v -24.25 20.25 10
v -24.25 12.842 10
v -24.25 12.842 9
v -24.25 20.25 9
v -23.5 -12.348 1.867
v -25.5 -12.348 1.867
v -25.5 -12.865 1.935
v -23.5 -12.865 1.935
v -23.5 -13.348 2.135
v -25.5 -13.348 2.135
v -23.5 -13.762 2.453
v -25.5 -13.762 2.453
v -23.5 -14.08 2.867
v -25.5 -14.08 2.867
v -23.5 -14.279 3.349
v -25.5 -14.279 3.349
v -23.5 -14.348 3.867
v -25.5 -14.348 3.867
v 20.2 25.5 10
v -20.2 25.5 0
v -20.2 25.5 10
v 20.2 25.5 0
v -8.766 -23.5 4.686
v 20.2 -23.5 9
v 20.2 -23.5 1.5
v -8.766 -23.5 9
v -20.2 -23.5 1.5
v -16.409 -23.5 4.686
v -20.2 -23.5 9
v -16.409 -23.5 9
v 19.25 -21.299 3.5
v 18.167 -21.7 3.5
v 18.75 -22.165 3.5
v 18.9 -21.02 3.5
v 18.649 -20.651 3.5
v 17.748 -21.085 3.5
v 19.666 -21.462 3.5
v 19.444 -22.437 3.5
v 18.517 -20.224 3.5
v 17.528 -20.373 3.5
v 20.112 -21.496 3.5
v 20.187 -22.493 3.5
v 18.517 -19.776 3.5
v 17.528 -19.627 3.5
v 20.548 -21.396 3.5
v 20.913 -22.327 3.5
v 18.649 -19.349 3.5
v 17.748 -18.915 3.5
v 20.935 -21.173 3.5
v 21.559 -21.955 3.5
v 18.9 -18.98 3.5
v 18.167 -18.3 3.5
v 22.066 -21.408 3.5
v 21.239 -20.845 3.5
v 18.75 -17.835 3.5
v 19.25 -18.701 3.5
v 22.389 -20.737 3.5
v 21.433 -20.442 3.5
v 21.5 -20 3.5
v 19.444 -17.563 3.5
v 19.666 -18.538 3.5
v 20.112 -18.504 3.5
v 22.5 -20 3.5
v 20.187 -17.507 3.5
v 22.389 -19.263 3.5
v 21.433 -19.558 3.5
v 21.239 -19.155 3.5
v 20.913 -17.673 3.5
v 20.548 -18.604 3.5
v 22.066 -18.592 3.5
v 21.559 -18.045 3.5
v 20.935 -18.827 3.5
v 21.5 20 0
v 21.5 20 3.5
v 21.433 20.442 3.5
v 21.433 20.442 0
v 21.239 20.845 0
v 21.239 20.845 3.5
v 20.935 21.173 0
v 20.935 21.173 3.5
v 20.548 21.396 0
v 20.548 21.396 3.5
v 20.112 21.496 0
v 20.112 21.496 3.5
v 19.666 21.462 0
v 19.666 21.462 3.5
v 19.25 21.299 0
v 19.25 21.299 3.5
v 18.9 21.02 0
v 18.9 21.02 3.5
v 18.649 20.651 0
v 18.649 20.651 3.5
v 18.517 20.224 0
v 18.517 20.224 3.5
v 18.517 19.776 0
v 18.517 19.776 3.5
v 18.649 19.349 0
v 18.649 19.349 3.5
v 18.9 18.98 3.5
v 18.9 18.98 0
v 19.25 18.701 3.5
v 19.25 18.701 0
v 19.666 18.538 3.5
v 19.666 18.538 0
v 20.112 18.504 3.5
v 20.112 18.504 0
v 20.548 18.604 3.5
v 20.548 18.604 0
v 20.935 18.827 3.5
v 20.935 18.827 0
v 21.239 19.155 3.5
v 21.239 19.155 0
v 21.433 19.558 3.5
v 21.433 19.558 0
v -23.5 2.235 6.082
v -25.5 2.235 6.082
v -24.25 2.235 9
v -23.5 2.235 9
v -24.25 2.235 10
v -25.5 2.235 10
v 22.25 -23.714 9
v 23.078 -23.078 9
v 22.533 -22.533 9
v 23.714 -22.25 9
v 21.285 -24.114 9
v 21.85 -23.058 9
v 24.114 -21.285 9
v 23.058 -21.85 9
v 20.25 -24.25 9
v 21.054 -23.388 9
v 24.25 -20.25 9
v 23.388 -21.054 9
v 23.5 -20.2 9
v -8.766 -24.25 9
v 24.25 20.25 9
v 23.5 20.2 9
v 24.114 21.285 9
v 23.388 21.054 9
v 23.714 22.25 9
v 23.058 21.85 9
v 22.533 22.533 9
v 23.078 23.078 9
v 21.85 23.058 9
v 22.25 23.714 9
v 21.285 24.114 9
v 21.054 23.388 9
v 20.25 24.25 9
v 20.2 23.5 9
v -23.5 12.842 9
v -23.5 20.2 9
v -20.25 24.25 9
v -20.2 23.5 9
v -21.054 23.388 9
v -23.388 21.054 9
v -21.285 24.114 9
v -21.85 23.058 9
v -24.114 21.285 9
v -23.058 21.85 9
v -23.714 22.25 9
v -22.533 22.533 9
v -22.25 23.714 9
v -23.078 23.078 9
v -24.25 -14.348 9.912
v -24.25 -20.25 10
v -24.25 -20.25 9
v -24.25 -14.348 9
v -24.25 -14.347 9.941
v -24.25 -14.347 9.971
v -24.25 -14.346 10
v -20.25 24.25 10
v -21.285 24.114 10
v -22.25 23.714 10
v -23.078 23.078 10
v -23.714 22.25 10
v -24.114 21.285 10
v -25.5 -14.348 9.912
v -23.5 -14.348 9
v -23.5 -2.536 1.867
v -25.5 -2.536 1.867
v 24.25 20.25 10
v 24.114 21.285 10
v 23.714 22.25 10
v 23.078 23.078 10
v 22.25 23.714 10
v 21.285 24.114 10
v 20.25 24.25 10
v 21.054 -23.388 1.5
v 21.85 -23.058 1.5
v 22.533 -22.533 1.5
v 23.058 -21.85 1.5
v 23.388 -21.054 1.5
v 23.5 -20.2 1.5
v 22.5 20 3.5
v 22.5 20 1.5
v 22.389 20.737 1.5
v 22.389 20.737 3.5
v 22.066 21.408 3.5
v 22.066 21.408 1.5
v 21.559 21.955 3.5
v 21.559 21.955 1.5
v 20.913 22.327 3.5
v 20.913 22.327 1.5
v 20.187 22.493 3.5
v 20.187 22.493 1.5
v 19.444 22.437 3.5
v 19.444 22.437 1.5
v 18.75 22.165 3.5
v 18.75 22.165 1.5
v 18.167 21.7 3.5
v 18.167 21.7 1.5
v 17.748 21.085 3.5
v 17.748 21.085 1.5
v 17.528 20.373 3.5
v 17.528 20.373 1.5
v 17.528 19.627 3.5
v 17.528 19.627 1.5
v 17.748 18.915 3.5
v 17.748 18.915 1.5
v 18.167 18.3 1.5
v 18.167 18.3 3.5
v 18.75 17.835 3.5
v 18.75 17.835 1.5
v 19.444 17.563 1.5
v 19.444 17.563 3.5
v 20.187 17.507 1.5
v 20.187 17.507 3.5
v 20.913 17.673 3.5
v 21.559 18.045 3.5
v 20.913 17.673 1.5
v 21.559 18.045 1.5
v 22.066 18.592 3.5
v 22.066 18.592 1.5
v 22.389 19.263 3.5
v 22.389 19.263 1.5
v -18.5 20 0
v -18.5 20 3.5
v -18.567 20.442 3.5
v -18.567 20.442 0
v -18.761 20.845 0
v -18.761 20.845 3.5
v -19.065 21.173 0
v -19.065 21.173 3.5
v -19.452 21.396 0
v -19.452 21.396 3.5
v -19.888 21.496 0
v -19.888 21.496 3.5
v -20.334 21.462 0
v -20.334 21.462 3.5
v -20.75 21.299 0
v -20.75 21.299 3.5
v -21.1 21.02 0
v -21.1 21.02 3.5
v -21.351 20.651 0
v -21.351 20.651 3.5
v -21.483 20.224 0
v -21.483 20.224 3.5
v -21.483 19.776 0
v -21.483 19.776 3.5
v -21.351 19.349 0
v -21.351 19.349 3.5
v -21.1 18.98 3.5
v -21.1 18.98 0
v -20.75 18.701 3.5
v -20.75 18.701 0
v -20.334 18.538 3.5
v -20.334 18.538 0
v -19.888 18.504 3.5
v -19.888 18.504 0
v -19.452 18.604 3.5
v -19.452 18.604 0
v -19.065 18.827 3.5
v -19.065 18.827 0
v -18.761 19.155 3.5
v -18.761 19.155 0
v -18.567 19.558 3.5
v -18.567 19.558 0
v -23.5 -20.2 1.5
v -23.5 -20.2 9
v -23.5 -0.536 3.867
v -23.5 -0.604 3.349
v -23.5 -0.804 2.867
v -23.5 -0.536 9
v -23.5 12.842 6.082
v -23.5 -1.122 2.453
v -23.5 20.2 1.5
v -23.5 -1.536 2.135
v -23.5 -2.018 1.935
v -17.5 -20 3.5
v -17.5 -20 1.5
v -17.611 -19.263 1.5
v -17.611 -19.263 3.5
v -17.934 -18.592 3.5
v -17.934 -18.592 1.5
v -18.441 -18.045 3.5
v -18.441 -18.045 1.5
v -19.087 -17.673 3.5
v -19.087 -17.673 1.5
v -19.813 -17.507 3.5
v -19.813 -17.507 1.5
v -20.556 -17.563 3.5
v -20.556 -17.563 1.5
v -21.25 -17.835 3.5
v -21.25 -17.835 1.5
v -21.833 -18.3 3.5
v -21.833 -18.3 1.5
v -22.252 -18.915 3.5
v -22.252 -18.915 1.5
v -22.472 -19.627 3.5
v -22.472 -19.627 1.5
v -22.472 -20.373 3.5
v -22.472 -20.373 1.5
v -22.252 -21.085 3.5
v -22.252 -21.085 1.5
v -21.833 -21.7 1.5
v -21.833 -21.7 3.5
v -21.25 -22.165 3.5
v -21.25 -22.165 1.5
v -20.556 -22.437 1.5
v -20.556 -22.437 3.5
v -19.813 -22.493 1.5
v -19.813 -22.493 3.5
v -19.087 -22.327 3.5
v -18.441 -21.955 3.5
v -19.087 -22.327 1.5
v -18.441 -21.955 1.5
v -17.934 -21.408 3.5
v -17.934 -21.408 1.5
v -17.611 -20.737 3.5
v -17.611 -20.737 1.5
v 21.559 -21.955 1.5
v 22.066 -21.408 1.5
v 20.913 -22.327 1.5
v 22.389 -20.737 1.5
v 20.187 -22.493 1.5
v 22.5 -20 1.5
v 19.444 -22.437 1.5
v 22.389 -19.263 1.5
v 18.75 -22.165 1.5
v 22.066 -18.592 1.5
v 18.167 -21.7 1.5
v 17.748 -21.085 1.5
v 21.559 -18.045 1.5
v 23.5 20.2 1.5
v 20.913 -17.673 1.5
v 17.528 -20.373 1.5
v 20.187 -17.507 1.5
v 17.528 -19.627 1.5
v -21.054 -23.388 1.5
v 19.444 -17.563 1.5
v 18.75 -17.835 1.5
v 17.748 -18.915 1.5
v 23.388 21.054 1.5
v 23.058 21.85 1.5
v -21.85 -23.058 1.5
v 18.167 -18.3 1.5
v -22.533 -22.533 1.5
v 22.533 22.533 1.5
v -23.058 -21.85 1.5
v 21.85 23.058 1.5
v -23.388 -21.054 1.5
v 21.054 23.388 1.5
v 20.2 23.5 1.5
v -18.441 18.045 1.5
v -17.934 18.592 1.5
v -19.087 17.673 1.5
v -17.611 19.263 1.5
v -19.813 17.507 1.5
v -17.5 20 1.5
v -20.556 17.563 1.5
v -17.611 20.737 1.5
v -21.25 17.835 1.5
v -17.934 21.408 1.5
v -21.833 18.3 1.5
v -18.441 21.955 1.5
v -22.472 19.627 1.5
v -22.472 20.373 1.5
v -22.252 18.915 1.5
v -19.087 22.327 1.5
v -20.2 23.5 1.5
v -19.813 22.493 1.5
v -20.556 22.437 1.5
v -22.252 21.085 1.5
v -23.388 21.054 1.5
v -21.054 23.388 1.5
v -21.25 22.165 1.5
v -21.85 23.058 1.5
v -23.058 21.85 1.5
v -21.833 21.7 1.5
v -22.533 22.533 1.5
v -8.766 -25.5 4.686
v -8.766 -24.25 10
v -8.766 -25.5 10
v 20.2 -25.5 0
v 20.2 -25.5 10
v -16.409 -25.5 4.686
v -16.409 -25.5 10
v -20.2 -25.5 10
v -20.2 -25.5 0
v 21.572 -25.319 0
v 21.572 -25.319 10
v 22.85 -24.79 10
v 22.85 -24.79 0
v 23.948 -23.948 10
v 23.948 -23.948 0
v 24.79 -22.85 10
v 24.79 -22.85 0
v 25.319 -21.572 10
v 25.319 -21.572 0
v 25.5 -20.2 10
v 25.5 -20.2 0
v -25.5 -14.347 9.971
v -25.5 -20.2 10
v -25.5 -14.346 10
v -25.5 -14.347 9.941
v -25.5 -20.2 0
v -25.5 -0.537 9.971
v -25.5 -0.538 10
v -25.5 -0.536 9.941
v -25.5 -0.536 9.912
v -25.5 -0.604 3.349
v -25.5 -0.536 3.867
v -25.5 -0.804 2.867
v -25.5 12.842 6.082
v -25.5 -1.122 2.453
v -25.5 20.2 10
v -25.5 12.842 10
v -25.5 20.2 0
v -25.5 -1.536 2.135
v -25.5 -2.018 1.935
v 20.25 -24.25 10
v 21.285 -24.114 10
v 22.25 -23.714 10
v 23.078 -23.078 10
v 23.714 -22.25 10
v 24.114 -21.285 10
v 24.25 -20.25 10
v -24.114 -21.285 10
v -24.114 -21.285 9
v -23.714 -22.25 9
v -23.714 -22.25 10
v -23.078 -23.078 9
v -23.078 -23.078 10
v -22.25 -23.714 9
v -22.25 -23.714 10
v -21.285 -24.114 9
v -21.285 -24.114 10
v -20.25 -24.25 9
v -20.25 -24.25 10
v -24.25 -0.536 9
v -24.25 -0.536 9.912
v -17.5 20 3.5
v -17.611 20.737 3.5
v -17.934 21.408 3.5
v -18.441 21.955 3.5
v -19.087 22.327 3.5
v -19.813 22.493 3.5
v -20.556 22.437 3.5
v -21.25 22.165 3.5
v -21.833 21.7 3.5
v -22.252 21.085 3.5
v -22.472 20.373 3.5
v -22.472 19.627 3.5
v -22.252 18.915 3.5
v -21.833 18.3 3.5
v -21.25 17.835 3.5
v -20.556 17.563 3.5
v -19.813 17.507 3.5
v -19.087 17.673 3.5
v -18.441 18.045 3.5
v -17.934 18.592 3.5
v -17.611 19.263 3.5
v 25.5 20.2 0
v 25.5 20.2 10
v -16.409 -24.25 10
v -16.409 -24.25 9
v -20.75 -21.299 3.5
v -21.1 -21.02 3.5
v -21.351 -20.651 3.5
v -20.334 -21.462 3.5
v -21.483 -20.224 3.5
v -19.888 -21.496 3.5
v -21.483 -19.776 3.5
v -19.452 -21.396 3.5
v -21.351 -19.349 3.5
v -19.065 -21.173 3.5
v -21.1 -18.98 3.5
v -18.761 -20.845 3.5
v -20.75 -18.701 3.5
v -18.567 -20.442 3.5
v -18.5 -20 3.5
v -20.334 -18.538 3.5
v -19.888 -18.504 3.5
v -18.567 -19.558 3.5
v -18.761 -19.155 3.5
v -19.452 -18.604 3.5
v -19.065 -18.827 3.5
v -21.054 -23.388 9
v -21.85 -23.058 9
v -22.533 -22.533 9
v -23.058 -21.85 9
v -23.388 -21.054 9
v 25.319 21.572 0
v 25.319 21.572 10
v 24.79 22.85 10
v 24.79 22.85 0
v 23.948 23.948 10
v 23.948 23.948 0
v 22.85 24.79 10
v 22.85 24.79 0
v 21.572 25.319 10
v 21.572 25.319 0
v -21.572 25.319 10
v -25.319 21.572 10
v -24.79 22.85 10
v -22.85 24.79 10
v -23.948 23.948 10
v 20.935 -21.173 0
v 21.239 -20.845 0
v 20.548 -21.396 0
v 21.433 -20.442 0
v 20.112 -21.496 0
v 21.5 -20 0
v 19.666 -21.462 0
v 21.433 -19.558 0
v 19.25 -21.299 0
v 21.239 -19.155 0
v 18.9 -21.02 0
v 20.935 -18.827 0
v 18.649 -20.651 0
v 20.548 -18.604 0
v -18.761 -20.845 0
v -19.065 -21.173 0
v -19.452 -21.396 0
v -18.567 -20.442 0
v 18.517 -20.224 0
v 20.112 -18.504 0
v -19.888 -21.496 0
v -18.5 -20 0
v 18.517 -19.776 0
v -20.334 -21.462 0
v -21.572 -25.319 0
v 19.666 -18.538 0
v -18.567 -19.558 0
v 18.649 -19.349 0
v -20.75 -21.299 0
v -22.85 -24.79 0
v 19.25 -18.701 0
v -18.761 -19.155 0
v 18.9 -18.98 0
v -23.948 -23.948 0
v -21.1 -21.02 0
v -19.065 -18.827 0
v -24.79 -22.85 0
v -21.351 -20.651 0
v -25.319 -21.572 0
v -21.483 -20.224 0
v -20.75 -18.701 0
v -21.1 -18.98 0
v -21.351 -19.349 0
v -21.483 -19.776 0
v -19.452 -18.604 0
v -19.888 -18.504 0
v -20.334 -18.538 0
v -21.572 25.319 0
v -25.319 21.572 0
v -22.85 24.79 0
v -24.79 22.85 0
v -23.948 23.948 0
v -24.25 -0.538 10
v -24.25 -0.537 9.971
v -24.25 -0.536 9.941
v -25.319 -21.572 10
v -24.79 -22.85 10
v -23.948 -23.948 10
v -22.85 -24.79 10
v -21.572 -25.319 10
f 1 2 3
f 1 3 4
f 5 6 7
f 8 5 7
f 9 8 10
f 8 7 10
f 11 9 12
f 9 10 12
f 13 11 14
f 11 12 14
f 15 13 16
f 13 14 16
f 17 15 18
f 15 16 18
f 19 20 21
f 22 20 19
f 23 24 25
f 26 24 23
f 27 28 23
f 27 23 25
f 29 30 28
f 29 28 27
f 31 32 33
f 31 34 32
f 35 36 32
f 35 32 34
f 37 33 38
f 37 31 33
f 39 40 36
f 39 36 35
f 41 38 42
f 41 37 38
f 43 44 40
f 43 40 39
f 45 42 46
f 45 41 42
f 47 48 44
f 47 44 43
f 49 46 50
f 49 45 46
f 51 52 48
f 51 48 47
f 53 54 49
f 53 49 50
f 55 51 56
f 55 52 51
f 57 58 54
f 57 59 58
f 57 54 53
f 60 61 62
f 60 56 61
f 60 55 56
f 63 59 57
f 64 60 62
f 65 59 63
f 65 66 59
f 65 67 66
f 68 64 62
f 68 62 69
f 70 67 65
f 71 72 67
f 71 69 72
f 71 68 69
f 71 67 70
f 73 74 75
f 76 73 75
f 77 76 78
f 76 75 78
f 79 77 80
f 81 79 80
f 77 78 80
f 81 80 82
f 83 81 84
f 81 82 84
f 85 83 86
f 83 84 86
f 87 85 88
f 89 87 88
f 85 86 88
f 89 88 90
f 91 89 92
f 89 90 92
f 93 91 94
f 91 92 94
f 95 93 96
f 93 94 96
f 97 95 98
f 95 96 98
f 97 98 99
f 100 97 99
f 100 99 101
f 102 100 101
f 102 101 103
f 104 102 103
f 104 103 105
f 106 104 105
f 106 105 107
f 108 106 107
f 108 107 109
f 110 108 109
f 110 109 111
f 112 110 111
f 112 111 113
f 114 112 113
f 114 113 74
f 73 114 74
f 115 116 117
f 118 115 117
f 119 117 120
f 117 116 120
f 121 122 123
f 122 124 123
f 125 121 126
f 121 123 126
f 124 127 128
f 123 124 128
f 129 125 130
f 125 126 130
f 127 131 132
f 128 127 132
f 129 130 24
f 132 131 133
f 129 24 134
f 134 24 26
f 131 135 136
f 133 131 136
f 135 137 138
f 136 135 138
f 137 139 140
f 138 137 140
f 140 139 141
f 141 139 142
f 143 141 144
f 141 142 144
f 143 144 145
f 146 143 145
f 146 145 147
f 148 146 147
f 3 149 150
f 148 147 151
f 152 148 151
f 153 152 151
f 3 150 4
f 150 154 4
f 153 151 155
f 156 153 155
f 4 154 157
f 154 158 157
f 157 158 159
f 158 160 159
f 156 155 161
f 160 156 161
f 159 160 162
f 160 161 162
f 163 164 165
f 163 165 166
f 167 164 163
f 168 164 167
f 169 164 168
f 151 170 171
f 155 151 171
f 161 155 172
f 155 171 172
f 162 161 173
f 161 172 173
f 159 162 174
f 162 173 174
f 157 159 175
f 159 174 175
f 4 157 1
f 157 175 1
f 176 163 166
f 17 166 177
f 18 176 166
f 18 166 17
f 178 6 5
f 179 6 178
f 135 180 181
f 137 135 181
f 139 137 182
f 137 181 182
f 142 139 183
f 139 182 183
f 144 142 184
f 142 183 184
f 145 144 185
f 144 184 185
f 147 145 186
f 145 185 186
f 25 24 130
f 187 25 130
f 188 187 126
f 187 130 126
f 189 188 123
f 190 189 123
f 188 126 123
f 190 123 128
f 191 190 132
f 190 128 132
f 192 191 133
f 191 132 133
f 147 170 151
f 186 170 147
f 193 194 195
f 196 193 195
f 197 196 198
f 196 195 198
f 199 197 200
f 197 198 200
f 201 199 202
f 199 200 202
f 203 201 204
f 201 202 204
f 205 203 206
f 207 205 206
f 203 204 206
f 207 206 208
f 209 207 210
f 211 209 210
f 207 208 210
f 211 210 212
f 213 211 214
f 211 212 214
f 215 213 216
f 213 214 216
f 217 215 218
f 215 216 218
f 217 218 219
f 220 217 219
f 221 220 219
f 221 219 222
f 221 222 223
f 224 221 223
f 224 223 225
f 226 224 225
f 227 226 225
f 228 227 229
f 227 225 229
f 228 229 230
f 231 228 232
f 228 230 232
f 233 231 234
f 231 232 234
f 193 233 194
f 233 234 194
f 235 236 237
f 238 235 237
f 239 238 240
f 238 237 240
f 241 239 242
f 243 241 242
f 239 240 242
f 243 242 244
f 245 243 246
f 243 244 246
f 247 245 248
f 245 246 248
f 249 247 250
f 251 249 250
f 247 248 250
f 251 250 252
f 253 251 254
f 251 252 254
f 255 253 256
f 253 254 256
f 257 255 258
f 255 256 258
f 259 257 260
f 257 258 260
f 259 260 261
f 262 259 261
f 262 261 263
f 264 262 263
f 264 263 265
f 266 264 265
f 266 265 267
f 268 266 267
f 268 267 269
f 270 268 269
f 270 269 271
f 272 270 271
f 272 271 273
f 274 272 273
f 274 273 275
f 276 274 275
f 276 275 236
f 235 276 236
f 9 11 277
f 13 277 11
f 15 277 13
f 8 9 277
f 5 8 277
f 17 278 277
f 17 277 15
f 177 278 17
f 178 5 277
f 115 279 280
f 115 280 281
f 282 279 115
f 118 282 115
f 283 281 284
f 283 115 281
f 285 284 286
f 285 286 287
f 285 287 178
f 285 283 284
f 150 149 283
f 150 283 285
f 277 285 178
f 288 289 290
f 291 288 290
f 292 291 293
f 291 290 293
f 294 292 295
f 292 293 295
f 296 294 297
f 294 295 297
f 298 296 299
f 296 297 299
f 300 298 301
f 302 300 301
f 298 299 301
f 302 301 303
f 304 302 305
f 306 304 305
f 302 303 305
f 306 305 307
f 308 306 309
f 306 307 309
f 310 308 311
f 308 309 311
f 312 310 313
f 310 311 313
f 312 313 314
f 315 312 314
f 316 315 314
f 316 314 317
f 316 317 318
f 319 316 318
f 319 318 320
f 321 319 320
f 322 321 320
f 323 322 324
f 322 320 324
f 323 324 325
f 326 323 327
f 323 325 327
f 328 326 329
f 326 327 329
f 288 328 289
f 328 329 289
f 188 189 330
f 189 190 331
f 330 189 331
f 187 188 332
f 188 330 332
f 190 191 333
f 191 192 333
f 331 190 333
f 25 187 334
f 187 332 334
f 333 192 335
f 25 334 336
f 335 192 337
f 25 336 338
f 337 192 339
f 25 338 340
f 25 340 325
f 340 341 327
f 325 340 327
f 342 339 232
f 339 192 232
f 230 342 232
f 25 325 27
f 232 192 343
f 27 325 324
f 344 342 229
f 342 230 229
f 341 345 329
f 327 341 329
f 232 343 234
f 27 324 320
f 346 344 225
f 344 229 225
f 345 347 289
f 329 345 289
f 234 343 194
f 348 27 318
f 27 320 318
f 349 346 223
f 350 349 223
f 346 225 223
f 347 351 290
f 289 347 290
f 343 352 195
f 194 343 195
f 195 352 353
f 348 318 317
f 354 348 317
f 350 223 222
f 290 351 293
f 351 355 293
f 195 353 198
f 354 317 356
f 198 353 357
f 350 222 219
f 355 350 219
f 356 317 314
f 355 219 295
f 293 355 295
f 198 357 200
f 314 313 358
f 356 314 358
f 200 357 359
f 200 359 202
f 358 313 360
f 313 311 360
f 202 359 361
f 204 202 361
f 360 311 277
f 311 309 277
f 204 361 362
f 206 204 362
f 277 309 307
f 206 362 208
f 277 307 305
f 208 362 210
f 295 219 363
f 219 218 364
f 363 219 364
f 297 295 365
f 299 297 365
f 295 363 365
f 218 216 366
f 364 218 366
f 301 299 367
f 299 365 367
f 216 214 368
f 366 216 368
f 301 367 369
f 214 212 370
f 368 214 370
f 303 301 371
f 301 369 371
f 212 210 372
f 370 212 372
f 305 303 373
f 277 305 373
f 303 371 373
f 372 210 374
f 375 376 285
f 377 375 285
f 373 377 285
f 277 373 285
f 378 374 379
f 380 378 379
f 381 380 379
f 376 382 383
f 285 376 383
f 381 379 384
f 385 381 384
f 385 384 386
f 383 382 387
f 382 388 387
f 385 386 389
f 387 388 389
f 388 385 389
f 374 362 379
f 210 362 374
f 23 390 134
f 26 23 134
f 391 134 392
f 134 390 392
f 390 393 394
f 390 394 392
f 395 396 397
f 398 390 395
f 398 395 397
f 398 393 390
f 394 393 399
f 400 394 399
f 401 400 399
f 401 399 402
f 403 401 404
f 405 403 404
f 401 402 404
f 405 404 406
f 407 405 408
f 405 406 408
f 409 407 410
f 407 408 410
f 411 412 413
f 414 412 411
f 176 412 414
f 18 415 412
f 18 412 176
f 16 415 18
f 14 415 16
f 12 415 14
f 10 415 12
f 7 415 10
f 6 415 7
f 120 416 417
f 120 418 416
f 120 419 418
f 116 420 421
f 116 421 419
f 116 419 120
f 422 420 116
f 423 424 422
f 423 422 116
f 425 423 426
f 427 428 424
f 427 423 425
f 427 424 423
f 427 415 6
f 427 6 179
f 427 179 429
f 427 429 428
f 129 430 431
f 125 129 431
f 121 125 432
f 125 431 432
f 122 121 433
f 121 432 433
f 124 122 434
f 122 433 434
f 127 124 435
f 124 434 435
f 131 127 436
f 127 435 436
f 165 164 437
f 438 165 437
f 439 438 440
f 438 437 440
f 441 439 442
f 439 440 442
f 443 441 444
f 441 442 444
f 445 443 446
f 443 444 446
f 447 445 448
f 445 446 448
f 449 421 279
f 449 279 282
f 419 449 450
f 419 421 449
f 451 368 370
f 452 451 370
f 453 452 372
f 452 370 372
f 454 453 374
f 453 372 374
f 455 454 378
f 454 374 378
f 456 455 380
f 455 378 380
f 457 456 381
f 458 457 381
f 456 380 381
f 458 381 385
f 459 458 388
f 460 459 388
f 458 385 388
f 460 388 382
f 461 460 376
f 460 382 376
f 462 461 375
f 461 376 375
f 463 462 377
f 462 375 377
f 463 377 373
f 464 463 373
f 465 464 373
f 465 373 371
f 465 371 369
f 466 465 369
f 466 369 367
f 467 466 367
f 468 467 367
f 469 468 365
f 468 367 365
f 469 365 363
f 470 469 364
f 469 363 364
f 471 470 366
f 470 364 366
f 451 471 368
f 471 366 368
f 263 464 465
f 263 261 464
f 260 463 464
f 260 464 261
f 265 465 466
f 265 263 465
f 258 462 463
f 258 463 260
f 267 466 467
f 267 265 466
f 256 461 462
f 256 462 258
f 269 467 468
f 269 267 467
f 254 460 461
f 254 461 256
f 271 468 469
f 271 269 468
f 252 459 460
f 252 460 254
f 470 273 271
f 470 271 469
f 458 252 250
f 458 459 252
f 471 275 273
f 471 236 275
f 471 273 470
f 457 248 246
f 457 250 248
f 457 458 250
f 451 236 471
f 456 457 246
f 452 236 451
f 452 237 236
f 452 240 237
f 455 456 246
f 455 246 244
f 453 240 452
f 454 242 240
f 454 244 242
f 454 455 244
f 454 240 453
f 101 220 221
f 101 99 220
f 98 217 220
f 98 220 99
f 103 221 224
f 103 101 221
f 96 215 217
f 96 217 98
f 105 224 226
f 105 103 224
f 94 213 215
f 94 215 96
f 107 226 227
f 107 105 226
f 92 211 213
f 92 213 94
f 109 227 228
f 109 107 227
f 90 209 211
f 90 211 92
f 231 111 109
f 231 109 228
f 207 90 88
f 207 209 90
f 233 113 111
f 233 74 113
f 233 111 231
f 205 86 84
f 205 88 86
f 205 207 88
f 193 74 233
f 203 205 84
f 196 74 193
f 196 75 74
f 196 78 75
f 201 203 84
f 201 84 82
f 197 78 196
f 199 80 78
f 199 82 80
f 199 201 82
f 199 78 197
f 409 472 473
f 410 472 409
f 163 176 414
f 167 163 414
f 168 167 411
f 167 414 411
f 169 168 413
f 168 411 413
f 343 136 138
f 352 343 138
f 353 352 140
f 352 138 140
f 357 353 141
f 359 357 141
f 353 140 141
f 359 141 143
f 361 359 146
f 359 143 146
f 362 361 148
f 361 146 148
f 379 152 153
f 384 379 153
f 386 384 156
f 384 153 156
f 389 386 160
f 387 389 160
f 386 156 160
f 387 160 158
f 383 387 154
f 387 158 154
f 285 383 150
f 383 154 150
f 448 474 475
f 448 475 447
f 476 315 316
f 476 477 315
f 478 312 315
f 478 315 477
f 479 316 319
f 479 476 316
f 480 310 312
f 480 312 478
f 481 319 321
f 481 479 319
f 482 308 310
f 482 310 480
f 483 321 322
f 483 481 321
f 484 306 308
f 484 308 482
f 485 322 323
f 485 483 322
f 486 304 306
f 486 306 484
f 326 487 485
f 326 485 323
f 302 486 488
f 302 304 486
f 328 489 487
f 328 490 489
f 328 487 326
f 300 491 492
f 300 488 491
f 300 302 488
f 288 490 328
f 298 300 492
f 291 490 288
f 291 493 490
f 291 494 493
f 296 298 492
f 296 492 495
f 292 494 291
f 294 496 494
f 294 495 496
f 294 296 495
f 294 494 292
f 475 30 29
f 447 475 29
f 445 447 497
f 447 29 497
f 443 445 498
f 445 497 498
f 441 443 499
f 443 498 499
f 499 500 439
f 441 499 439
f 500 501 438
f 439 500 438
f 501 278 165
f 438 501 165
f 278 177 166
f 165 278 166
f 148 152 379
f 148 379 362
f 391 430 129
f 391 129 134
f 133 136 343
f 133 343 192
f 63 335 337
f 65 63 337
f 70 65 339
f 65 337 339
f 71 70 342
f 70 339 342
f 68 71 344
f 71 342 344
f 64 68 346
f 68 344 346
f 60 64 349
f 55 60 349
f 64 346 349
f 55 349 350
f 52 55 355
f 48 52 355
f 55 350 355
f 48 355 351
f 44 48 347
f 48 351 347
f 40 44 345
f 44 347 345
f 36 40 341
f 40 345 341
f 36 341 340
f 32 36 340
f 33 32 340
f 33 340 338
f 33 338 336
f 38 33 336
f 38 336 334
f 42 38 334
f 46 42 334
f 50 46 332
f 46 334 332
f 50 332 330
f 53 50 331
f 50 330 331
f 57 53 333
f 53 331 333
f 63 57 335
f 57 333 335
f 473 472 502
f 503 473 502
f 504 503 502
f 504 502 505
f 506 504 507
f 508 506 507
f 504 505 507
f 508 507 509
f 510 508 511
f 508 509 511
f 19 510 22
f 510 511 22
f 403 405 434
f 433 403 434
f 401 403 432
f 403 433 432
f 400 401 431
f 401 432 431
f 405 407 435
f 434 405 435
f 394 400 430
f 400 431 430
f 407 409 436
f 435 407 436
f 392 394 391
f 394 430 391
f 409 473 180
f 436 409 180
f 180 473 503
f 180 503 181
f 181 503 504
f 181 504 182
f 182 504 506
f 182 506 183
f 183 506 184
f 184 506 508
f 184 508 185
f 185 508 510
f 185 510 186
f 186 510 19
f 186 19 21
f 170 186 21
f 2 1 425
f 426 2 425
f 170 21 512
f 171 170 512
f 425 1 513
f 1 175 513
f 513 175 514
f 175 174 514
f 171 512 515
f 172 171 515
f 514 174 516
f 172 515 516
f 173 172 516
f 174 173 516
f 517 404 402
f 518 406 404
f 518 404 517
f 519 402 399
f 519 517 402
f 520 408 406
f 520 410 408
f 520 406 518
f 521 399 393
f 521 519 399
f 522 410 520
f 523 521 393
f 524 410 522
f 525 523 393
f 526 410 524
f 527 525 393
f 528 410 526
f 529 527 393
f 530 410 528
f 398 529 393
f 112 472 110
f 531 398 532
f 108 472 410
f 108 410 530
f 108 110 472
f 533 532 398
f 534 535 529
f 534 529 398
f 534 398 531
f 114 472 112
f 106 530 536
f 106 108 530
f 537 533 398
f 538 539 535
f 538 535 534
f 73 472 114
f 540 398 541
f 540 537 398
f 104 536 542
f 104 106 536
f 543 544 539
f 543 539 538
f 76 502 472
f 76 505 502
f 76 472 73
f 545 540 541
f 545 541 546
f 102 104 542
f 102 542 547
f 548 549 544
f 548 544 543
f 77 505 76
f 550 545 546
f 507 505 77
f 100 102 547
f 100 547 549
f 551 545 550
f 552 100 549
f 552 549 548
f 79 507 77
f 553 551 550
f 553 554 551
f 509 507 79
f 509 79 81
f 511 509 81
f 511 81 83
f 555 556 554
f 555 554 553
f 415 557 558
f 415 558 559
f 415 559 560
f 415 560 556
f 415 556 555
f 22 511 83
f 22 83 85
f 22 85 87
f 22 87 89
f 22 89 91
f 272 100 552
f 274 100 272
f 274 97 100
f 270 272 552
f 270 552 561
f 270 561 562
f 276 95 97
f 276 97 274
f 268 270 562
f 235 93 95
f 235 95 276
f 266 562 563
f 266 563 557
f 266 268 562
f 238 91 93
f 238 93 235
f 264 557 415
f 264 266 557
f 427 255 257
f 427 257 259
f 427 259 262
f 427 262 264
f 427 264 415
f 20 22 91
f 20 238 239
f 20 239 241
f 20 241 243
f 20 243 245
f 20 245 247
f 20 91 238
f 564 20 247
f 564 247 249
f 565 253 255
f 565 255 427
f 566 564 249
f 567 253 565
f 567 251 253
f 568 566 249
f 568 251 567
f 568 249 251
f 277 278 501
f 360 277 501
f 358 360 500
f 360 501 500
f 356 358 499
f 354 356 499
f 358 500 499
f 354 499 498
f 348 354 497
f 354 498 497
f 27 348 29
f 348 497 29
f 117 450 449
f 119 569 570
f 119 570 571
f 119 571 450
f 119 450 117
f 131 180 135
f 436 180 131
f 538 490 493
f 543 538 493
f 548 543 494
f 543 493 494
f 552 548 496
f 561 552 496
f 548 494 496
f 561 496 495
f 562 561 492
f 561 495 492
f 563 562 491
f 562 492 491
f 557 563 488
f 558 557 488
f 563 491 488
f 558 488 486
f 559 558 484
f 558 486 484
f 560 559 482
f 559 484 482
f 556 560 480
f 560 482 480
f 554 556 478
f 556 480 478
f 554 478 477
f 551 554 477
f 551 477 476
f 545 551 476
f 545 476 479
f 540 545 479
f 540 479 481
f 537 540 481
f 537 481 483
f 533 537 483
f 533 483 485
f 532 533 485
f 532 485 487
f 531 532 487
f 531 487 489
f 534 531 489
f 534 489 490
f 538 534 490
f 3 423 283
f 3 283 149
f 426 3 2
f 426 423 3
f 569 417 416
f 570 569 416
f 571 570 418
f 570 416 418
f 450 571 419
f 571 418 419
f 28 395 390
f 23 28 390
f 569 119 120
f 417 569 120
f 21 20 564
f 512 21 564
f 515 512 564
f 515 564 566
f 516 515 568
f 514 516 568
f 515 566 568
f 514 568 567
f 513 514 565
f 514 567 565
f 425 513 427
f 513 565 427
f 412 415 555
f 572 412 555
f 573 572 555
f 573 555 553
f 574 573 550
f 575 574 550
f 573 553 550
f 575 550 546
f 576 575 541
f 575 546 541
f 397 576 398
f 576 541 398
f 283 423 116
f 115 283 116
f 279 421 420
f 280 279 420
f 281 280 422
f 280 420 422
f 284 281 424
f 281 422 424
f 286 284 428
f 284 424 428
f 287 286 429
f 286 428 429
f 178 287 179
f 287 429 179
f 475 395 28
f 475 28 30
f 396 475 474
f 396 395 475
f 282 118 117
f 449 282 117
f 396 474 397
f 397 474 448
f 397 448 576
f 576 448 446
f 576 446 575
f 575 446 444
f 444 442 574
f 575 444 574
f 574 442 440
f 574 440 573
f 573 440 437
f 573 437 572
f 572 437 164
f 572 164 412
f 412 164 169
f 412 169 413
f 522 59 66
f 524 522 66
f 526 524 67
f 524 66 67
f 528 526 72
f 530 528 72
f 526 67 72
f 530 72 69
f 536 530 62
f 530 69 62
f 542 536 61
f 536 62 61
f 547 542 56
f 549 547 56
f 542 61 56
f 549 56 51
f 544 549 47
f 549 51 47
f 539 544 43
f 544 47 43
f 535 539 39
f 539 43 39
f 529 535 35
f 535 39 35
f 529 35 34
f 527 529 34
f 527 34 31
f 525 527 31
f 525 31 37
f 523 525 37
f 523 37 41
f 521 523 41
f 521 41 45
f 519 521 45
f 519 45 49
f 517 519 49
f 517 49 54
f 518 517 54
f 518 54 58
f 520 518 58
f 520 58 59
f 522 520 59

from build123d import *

# Parameters (mm, degrees)
PAD005_DEPTH    = 4
PAD_DEPTH       = 10
POCKET_DEPTH    = 4.5
POCKET001_DEPTH = 1
SKETCH002_R     = 2.5
PAD004_DEPTH    = 2
SKETCH003_R     = 1.5
POCKET002_DEPTH = 3.501
SKETCH009_W     = 10.607274
SKETCH009_H     = 4.434788
POCKET003_DEPTH = 5
SKETCH010_W     = 7.64298
SKETCH010_H     = 5.328556
POCKET004_DEPTH = 5


with BuildPart() as usb_c_cutter:
    # Sketch008 → Pad005 (new body)
    with BuildSketch(Plane(origin=(0, 0, 0), x_dir=(0, -1, 0), z_dir=(-1, 0, 0))):
        with BuildLine():
            Line((2.535801, 11.911979), (12.347588, 11.911979))
            ThreePointArc((14.347588, 9.911979), (13.761802, 11.326192), (12.347588, 11.911979))
            Line((14.347588, 9.911979), (14.347588, 3.866895))
            ThreePointArc((12.347588, 1.866895), (13.761802, 2.452682), (14.347588, 3.866895))
            Line((12.347588, 1.866895), (2.535801, 1.866895))
            ThreePointArc((0.535801, 3.866895), (1.121588, 2.452682), (2.535801, 1.866895))
            Line((0.535801, 3.866895), (0.535801, 9.911979))
            ThreePointArc((2.535801, 11.911979), (1.121588, 11.326192), (0.535801, 9.911979))
        make_face()
    extrude(amount=-PAD005_DEPTH)


with BuildPart() as usb_c_cutter_1:
    # Body002 placement: moved
    add(usb_c_cutter.part.moved(Location((-26, 0, 0))))


with BuildPart() as body_pocketed:
    # Sketch001 → Pad (new body)
    with BuildSketch(Plane.XY):
        with BuildLine():
            Line((-20.2, 25.5), (20.2, 25.5))
            ThreePointArc((25.5, 20.2), (23.947666, 23.947666), (20.2, 25.5))
            Line((25.5, 20.2), (25.5, -20.2))
            ThreePointArc((20.2, -25.5), (23.947666, -23.947666), (25.5, -20.2))
            Line((20.2, -25.5), (-20.2, -25.5))
            ThreePointArc((-25.5, -20.2), (-23.947666, -23.947666), (-20.2, -25.5))
            Line((-25.5, -20.2), (-25.5, 20.2))
            ThreePointArc((-20.2, 25.5), (-23.947666, 23.947666), (-25.5, 20.2))
        make_face()
    extrude(amount=PAD_DEPTH)

    # Sketch → Pocket (cut, symmetric)
    with BuildSketch(Plane.XY.offset(6)):
        with BuildLine():
            Line((-20.2, 23.5), (20.2, 23.5))
            ThreePointArc((23.5, 20.2), (22.533452, 22.533452), (20.2, 23.5))
            Line((23.5, 20.2), (23.5, -20.2))
            ThreePointArc((20.2, -23.5), (22.533452, -22.533452), (23.5, -20.2))
            Line((20.2, -23.5), (-20.2, -23.5))
            ThreePointArc((-23.5, -20.2), (-22.533452, -22.533452), (-20.2, -23.5))
            Line((-23.5, -20.2), (-23.5, 20.2))
            ThreePointArc((-20.2, 23.5), (-22.533452, 22.533452), (-23.5, 20.2))
        make_face()
    extrude(amount=POCKET_DEPTH, both=True, mode=Mode.SUBTRACT)

    # Sketch004 (on Face5 of Pocket) → Pocket001 (cut, symmetric)
    with BuildSketch(Plane.XY.offset(10)):
        with BuildLine():
            Line((-20.25, 24.25), (20.25, 24.25))
            ThreePointArc((24.25, 20.25), (23.078427, 23.078427), (20.25, 24.25))
            Line((24.25, 20.25), (24.25, -20.25))
            ThreePointArc((20.25, -24.25), (23.078427, -23.078427), (24.25, -20.25))
            Line((20.25, -24.25), (-20.25, -24.25))
            ThreePointArc((-24.25, -20.25), (-23.078427, -23.078427), (-20.25, -24.25))
            Line((-24.25, -20.25), (-24.25, 20.25))
            ThreePointArc((-20.25, 24.25), (-23.078427, 23.078427), (-24.25, 20.25))
        make_face()
    extrude(amount=POCKET001_DEPTH, both=True, mode=Mode.SUBTRACT)

    # Sketch002 (on Face19 of Pocket) → Pad004 (join)
    with BuildSketch(Plane.XY.offset(1.5)):
        with Locations((-20, 20)):
            Circle(SKETCH002_R)
        with Locations((20, 20)):
            Circle(SKETCH002_R)
        with Locations((20, -20)):
            Circle(SKETCH002_R)
        with Locations((-20, -20)):
            Circle(SKETCH002_R)
    extrude(amount=PAD004_DEPTH)

    # Sketch003 → Pocket002 (cut, through all)
    with BuildSketch(Plane.XY.offset(3.5)):
        with Locations((-20, 20)):
            Circle(SKETCH003_R)
        with Locations((20, 20)):
            Circle(SKETCH003_R)
        with Locations((20, -20)):
            Circle(SKETCH003_R)
        with Locations((-20, -20)):
            Circle(SKETCH003_R)
    extrude(amount=-POCKET002_DEPTH, mode=Mode.SUBTRACT)

    # Cut001: cut USB-C Cutter
    add(usb_c_cutter_1.part, mode=Mode.SUBTRACT)

    # Sketch009 (on Face1 of BaseFeature) → Pocket003 (cut)
    with BuildSketch(Plane(origin=(-25.5, 0, 0), x_dir=(0, -1, 0), z_dir=(-1, 0, 0))):
        with Locations((-7.538411, 8.299654)):
            Rectangle(SKETCH009_W, SKETCH009_H)
    extrude(amount=-POCKET003_DEPTH, mode=Mode.SUBTRACT)

    # Sketch010 (on Face17 of Pocket003) → Pocket004 (cut)
    with BuildSketch(Plane.XZ.offset(25.5)):
        with Locations((-12.587816, 7.350035)):
            Rectangle(SKETCH010_W, SKETCH010_H)
    extrude(amount=-POCKET004_DEPTH, mode=Mode.SUBTRACT)


solid = body_pocketed.part
